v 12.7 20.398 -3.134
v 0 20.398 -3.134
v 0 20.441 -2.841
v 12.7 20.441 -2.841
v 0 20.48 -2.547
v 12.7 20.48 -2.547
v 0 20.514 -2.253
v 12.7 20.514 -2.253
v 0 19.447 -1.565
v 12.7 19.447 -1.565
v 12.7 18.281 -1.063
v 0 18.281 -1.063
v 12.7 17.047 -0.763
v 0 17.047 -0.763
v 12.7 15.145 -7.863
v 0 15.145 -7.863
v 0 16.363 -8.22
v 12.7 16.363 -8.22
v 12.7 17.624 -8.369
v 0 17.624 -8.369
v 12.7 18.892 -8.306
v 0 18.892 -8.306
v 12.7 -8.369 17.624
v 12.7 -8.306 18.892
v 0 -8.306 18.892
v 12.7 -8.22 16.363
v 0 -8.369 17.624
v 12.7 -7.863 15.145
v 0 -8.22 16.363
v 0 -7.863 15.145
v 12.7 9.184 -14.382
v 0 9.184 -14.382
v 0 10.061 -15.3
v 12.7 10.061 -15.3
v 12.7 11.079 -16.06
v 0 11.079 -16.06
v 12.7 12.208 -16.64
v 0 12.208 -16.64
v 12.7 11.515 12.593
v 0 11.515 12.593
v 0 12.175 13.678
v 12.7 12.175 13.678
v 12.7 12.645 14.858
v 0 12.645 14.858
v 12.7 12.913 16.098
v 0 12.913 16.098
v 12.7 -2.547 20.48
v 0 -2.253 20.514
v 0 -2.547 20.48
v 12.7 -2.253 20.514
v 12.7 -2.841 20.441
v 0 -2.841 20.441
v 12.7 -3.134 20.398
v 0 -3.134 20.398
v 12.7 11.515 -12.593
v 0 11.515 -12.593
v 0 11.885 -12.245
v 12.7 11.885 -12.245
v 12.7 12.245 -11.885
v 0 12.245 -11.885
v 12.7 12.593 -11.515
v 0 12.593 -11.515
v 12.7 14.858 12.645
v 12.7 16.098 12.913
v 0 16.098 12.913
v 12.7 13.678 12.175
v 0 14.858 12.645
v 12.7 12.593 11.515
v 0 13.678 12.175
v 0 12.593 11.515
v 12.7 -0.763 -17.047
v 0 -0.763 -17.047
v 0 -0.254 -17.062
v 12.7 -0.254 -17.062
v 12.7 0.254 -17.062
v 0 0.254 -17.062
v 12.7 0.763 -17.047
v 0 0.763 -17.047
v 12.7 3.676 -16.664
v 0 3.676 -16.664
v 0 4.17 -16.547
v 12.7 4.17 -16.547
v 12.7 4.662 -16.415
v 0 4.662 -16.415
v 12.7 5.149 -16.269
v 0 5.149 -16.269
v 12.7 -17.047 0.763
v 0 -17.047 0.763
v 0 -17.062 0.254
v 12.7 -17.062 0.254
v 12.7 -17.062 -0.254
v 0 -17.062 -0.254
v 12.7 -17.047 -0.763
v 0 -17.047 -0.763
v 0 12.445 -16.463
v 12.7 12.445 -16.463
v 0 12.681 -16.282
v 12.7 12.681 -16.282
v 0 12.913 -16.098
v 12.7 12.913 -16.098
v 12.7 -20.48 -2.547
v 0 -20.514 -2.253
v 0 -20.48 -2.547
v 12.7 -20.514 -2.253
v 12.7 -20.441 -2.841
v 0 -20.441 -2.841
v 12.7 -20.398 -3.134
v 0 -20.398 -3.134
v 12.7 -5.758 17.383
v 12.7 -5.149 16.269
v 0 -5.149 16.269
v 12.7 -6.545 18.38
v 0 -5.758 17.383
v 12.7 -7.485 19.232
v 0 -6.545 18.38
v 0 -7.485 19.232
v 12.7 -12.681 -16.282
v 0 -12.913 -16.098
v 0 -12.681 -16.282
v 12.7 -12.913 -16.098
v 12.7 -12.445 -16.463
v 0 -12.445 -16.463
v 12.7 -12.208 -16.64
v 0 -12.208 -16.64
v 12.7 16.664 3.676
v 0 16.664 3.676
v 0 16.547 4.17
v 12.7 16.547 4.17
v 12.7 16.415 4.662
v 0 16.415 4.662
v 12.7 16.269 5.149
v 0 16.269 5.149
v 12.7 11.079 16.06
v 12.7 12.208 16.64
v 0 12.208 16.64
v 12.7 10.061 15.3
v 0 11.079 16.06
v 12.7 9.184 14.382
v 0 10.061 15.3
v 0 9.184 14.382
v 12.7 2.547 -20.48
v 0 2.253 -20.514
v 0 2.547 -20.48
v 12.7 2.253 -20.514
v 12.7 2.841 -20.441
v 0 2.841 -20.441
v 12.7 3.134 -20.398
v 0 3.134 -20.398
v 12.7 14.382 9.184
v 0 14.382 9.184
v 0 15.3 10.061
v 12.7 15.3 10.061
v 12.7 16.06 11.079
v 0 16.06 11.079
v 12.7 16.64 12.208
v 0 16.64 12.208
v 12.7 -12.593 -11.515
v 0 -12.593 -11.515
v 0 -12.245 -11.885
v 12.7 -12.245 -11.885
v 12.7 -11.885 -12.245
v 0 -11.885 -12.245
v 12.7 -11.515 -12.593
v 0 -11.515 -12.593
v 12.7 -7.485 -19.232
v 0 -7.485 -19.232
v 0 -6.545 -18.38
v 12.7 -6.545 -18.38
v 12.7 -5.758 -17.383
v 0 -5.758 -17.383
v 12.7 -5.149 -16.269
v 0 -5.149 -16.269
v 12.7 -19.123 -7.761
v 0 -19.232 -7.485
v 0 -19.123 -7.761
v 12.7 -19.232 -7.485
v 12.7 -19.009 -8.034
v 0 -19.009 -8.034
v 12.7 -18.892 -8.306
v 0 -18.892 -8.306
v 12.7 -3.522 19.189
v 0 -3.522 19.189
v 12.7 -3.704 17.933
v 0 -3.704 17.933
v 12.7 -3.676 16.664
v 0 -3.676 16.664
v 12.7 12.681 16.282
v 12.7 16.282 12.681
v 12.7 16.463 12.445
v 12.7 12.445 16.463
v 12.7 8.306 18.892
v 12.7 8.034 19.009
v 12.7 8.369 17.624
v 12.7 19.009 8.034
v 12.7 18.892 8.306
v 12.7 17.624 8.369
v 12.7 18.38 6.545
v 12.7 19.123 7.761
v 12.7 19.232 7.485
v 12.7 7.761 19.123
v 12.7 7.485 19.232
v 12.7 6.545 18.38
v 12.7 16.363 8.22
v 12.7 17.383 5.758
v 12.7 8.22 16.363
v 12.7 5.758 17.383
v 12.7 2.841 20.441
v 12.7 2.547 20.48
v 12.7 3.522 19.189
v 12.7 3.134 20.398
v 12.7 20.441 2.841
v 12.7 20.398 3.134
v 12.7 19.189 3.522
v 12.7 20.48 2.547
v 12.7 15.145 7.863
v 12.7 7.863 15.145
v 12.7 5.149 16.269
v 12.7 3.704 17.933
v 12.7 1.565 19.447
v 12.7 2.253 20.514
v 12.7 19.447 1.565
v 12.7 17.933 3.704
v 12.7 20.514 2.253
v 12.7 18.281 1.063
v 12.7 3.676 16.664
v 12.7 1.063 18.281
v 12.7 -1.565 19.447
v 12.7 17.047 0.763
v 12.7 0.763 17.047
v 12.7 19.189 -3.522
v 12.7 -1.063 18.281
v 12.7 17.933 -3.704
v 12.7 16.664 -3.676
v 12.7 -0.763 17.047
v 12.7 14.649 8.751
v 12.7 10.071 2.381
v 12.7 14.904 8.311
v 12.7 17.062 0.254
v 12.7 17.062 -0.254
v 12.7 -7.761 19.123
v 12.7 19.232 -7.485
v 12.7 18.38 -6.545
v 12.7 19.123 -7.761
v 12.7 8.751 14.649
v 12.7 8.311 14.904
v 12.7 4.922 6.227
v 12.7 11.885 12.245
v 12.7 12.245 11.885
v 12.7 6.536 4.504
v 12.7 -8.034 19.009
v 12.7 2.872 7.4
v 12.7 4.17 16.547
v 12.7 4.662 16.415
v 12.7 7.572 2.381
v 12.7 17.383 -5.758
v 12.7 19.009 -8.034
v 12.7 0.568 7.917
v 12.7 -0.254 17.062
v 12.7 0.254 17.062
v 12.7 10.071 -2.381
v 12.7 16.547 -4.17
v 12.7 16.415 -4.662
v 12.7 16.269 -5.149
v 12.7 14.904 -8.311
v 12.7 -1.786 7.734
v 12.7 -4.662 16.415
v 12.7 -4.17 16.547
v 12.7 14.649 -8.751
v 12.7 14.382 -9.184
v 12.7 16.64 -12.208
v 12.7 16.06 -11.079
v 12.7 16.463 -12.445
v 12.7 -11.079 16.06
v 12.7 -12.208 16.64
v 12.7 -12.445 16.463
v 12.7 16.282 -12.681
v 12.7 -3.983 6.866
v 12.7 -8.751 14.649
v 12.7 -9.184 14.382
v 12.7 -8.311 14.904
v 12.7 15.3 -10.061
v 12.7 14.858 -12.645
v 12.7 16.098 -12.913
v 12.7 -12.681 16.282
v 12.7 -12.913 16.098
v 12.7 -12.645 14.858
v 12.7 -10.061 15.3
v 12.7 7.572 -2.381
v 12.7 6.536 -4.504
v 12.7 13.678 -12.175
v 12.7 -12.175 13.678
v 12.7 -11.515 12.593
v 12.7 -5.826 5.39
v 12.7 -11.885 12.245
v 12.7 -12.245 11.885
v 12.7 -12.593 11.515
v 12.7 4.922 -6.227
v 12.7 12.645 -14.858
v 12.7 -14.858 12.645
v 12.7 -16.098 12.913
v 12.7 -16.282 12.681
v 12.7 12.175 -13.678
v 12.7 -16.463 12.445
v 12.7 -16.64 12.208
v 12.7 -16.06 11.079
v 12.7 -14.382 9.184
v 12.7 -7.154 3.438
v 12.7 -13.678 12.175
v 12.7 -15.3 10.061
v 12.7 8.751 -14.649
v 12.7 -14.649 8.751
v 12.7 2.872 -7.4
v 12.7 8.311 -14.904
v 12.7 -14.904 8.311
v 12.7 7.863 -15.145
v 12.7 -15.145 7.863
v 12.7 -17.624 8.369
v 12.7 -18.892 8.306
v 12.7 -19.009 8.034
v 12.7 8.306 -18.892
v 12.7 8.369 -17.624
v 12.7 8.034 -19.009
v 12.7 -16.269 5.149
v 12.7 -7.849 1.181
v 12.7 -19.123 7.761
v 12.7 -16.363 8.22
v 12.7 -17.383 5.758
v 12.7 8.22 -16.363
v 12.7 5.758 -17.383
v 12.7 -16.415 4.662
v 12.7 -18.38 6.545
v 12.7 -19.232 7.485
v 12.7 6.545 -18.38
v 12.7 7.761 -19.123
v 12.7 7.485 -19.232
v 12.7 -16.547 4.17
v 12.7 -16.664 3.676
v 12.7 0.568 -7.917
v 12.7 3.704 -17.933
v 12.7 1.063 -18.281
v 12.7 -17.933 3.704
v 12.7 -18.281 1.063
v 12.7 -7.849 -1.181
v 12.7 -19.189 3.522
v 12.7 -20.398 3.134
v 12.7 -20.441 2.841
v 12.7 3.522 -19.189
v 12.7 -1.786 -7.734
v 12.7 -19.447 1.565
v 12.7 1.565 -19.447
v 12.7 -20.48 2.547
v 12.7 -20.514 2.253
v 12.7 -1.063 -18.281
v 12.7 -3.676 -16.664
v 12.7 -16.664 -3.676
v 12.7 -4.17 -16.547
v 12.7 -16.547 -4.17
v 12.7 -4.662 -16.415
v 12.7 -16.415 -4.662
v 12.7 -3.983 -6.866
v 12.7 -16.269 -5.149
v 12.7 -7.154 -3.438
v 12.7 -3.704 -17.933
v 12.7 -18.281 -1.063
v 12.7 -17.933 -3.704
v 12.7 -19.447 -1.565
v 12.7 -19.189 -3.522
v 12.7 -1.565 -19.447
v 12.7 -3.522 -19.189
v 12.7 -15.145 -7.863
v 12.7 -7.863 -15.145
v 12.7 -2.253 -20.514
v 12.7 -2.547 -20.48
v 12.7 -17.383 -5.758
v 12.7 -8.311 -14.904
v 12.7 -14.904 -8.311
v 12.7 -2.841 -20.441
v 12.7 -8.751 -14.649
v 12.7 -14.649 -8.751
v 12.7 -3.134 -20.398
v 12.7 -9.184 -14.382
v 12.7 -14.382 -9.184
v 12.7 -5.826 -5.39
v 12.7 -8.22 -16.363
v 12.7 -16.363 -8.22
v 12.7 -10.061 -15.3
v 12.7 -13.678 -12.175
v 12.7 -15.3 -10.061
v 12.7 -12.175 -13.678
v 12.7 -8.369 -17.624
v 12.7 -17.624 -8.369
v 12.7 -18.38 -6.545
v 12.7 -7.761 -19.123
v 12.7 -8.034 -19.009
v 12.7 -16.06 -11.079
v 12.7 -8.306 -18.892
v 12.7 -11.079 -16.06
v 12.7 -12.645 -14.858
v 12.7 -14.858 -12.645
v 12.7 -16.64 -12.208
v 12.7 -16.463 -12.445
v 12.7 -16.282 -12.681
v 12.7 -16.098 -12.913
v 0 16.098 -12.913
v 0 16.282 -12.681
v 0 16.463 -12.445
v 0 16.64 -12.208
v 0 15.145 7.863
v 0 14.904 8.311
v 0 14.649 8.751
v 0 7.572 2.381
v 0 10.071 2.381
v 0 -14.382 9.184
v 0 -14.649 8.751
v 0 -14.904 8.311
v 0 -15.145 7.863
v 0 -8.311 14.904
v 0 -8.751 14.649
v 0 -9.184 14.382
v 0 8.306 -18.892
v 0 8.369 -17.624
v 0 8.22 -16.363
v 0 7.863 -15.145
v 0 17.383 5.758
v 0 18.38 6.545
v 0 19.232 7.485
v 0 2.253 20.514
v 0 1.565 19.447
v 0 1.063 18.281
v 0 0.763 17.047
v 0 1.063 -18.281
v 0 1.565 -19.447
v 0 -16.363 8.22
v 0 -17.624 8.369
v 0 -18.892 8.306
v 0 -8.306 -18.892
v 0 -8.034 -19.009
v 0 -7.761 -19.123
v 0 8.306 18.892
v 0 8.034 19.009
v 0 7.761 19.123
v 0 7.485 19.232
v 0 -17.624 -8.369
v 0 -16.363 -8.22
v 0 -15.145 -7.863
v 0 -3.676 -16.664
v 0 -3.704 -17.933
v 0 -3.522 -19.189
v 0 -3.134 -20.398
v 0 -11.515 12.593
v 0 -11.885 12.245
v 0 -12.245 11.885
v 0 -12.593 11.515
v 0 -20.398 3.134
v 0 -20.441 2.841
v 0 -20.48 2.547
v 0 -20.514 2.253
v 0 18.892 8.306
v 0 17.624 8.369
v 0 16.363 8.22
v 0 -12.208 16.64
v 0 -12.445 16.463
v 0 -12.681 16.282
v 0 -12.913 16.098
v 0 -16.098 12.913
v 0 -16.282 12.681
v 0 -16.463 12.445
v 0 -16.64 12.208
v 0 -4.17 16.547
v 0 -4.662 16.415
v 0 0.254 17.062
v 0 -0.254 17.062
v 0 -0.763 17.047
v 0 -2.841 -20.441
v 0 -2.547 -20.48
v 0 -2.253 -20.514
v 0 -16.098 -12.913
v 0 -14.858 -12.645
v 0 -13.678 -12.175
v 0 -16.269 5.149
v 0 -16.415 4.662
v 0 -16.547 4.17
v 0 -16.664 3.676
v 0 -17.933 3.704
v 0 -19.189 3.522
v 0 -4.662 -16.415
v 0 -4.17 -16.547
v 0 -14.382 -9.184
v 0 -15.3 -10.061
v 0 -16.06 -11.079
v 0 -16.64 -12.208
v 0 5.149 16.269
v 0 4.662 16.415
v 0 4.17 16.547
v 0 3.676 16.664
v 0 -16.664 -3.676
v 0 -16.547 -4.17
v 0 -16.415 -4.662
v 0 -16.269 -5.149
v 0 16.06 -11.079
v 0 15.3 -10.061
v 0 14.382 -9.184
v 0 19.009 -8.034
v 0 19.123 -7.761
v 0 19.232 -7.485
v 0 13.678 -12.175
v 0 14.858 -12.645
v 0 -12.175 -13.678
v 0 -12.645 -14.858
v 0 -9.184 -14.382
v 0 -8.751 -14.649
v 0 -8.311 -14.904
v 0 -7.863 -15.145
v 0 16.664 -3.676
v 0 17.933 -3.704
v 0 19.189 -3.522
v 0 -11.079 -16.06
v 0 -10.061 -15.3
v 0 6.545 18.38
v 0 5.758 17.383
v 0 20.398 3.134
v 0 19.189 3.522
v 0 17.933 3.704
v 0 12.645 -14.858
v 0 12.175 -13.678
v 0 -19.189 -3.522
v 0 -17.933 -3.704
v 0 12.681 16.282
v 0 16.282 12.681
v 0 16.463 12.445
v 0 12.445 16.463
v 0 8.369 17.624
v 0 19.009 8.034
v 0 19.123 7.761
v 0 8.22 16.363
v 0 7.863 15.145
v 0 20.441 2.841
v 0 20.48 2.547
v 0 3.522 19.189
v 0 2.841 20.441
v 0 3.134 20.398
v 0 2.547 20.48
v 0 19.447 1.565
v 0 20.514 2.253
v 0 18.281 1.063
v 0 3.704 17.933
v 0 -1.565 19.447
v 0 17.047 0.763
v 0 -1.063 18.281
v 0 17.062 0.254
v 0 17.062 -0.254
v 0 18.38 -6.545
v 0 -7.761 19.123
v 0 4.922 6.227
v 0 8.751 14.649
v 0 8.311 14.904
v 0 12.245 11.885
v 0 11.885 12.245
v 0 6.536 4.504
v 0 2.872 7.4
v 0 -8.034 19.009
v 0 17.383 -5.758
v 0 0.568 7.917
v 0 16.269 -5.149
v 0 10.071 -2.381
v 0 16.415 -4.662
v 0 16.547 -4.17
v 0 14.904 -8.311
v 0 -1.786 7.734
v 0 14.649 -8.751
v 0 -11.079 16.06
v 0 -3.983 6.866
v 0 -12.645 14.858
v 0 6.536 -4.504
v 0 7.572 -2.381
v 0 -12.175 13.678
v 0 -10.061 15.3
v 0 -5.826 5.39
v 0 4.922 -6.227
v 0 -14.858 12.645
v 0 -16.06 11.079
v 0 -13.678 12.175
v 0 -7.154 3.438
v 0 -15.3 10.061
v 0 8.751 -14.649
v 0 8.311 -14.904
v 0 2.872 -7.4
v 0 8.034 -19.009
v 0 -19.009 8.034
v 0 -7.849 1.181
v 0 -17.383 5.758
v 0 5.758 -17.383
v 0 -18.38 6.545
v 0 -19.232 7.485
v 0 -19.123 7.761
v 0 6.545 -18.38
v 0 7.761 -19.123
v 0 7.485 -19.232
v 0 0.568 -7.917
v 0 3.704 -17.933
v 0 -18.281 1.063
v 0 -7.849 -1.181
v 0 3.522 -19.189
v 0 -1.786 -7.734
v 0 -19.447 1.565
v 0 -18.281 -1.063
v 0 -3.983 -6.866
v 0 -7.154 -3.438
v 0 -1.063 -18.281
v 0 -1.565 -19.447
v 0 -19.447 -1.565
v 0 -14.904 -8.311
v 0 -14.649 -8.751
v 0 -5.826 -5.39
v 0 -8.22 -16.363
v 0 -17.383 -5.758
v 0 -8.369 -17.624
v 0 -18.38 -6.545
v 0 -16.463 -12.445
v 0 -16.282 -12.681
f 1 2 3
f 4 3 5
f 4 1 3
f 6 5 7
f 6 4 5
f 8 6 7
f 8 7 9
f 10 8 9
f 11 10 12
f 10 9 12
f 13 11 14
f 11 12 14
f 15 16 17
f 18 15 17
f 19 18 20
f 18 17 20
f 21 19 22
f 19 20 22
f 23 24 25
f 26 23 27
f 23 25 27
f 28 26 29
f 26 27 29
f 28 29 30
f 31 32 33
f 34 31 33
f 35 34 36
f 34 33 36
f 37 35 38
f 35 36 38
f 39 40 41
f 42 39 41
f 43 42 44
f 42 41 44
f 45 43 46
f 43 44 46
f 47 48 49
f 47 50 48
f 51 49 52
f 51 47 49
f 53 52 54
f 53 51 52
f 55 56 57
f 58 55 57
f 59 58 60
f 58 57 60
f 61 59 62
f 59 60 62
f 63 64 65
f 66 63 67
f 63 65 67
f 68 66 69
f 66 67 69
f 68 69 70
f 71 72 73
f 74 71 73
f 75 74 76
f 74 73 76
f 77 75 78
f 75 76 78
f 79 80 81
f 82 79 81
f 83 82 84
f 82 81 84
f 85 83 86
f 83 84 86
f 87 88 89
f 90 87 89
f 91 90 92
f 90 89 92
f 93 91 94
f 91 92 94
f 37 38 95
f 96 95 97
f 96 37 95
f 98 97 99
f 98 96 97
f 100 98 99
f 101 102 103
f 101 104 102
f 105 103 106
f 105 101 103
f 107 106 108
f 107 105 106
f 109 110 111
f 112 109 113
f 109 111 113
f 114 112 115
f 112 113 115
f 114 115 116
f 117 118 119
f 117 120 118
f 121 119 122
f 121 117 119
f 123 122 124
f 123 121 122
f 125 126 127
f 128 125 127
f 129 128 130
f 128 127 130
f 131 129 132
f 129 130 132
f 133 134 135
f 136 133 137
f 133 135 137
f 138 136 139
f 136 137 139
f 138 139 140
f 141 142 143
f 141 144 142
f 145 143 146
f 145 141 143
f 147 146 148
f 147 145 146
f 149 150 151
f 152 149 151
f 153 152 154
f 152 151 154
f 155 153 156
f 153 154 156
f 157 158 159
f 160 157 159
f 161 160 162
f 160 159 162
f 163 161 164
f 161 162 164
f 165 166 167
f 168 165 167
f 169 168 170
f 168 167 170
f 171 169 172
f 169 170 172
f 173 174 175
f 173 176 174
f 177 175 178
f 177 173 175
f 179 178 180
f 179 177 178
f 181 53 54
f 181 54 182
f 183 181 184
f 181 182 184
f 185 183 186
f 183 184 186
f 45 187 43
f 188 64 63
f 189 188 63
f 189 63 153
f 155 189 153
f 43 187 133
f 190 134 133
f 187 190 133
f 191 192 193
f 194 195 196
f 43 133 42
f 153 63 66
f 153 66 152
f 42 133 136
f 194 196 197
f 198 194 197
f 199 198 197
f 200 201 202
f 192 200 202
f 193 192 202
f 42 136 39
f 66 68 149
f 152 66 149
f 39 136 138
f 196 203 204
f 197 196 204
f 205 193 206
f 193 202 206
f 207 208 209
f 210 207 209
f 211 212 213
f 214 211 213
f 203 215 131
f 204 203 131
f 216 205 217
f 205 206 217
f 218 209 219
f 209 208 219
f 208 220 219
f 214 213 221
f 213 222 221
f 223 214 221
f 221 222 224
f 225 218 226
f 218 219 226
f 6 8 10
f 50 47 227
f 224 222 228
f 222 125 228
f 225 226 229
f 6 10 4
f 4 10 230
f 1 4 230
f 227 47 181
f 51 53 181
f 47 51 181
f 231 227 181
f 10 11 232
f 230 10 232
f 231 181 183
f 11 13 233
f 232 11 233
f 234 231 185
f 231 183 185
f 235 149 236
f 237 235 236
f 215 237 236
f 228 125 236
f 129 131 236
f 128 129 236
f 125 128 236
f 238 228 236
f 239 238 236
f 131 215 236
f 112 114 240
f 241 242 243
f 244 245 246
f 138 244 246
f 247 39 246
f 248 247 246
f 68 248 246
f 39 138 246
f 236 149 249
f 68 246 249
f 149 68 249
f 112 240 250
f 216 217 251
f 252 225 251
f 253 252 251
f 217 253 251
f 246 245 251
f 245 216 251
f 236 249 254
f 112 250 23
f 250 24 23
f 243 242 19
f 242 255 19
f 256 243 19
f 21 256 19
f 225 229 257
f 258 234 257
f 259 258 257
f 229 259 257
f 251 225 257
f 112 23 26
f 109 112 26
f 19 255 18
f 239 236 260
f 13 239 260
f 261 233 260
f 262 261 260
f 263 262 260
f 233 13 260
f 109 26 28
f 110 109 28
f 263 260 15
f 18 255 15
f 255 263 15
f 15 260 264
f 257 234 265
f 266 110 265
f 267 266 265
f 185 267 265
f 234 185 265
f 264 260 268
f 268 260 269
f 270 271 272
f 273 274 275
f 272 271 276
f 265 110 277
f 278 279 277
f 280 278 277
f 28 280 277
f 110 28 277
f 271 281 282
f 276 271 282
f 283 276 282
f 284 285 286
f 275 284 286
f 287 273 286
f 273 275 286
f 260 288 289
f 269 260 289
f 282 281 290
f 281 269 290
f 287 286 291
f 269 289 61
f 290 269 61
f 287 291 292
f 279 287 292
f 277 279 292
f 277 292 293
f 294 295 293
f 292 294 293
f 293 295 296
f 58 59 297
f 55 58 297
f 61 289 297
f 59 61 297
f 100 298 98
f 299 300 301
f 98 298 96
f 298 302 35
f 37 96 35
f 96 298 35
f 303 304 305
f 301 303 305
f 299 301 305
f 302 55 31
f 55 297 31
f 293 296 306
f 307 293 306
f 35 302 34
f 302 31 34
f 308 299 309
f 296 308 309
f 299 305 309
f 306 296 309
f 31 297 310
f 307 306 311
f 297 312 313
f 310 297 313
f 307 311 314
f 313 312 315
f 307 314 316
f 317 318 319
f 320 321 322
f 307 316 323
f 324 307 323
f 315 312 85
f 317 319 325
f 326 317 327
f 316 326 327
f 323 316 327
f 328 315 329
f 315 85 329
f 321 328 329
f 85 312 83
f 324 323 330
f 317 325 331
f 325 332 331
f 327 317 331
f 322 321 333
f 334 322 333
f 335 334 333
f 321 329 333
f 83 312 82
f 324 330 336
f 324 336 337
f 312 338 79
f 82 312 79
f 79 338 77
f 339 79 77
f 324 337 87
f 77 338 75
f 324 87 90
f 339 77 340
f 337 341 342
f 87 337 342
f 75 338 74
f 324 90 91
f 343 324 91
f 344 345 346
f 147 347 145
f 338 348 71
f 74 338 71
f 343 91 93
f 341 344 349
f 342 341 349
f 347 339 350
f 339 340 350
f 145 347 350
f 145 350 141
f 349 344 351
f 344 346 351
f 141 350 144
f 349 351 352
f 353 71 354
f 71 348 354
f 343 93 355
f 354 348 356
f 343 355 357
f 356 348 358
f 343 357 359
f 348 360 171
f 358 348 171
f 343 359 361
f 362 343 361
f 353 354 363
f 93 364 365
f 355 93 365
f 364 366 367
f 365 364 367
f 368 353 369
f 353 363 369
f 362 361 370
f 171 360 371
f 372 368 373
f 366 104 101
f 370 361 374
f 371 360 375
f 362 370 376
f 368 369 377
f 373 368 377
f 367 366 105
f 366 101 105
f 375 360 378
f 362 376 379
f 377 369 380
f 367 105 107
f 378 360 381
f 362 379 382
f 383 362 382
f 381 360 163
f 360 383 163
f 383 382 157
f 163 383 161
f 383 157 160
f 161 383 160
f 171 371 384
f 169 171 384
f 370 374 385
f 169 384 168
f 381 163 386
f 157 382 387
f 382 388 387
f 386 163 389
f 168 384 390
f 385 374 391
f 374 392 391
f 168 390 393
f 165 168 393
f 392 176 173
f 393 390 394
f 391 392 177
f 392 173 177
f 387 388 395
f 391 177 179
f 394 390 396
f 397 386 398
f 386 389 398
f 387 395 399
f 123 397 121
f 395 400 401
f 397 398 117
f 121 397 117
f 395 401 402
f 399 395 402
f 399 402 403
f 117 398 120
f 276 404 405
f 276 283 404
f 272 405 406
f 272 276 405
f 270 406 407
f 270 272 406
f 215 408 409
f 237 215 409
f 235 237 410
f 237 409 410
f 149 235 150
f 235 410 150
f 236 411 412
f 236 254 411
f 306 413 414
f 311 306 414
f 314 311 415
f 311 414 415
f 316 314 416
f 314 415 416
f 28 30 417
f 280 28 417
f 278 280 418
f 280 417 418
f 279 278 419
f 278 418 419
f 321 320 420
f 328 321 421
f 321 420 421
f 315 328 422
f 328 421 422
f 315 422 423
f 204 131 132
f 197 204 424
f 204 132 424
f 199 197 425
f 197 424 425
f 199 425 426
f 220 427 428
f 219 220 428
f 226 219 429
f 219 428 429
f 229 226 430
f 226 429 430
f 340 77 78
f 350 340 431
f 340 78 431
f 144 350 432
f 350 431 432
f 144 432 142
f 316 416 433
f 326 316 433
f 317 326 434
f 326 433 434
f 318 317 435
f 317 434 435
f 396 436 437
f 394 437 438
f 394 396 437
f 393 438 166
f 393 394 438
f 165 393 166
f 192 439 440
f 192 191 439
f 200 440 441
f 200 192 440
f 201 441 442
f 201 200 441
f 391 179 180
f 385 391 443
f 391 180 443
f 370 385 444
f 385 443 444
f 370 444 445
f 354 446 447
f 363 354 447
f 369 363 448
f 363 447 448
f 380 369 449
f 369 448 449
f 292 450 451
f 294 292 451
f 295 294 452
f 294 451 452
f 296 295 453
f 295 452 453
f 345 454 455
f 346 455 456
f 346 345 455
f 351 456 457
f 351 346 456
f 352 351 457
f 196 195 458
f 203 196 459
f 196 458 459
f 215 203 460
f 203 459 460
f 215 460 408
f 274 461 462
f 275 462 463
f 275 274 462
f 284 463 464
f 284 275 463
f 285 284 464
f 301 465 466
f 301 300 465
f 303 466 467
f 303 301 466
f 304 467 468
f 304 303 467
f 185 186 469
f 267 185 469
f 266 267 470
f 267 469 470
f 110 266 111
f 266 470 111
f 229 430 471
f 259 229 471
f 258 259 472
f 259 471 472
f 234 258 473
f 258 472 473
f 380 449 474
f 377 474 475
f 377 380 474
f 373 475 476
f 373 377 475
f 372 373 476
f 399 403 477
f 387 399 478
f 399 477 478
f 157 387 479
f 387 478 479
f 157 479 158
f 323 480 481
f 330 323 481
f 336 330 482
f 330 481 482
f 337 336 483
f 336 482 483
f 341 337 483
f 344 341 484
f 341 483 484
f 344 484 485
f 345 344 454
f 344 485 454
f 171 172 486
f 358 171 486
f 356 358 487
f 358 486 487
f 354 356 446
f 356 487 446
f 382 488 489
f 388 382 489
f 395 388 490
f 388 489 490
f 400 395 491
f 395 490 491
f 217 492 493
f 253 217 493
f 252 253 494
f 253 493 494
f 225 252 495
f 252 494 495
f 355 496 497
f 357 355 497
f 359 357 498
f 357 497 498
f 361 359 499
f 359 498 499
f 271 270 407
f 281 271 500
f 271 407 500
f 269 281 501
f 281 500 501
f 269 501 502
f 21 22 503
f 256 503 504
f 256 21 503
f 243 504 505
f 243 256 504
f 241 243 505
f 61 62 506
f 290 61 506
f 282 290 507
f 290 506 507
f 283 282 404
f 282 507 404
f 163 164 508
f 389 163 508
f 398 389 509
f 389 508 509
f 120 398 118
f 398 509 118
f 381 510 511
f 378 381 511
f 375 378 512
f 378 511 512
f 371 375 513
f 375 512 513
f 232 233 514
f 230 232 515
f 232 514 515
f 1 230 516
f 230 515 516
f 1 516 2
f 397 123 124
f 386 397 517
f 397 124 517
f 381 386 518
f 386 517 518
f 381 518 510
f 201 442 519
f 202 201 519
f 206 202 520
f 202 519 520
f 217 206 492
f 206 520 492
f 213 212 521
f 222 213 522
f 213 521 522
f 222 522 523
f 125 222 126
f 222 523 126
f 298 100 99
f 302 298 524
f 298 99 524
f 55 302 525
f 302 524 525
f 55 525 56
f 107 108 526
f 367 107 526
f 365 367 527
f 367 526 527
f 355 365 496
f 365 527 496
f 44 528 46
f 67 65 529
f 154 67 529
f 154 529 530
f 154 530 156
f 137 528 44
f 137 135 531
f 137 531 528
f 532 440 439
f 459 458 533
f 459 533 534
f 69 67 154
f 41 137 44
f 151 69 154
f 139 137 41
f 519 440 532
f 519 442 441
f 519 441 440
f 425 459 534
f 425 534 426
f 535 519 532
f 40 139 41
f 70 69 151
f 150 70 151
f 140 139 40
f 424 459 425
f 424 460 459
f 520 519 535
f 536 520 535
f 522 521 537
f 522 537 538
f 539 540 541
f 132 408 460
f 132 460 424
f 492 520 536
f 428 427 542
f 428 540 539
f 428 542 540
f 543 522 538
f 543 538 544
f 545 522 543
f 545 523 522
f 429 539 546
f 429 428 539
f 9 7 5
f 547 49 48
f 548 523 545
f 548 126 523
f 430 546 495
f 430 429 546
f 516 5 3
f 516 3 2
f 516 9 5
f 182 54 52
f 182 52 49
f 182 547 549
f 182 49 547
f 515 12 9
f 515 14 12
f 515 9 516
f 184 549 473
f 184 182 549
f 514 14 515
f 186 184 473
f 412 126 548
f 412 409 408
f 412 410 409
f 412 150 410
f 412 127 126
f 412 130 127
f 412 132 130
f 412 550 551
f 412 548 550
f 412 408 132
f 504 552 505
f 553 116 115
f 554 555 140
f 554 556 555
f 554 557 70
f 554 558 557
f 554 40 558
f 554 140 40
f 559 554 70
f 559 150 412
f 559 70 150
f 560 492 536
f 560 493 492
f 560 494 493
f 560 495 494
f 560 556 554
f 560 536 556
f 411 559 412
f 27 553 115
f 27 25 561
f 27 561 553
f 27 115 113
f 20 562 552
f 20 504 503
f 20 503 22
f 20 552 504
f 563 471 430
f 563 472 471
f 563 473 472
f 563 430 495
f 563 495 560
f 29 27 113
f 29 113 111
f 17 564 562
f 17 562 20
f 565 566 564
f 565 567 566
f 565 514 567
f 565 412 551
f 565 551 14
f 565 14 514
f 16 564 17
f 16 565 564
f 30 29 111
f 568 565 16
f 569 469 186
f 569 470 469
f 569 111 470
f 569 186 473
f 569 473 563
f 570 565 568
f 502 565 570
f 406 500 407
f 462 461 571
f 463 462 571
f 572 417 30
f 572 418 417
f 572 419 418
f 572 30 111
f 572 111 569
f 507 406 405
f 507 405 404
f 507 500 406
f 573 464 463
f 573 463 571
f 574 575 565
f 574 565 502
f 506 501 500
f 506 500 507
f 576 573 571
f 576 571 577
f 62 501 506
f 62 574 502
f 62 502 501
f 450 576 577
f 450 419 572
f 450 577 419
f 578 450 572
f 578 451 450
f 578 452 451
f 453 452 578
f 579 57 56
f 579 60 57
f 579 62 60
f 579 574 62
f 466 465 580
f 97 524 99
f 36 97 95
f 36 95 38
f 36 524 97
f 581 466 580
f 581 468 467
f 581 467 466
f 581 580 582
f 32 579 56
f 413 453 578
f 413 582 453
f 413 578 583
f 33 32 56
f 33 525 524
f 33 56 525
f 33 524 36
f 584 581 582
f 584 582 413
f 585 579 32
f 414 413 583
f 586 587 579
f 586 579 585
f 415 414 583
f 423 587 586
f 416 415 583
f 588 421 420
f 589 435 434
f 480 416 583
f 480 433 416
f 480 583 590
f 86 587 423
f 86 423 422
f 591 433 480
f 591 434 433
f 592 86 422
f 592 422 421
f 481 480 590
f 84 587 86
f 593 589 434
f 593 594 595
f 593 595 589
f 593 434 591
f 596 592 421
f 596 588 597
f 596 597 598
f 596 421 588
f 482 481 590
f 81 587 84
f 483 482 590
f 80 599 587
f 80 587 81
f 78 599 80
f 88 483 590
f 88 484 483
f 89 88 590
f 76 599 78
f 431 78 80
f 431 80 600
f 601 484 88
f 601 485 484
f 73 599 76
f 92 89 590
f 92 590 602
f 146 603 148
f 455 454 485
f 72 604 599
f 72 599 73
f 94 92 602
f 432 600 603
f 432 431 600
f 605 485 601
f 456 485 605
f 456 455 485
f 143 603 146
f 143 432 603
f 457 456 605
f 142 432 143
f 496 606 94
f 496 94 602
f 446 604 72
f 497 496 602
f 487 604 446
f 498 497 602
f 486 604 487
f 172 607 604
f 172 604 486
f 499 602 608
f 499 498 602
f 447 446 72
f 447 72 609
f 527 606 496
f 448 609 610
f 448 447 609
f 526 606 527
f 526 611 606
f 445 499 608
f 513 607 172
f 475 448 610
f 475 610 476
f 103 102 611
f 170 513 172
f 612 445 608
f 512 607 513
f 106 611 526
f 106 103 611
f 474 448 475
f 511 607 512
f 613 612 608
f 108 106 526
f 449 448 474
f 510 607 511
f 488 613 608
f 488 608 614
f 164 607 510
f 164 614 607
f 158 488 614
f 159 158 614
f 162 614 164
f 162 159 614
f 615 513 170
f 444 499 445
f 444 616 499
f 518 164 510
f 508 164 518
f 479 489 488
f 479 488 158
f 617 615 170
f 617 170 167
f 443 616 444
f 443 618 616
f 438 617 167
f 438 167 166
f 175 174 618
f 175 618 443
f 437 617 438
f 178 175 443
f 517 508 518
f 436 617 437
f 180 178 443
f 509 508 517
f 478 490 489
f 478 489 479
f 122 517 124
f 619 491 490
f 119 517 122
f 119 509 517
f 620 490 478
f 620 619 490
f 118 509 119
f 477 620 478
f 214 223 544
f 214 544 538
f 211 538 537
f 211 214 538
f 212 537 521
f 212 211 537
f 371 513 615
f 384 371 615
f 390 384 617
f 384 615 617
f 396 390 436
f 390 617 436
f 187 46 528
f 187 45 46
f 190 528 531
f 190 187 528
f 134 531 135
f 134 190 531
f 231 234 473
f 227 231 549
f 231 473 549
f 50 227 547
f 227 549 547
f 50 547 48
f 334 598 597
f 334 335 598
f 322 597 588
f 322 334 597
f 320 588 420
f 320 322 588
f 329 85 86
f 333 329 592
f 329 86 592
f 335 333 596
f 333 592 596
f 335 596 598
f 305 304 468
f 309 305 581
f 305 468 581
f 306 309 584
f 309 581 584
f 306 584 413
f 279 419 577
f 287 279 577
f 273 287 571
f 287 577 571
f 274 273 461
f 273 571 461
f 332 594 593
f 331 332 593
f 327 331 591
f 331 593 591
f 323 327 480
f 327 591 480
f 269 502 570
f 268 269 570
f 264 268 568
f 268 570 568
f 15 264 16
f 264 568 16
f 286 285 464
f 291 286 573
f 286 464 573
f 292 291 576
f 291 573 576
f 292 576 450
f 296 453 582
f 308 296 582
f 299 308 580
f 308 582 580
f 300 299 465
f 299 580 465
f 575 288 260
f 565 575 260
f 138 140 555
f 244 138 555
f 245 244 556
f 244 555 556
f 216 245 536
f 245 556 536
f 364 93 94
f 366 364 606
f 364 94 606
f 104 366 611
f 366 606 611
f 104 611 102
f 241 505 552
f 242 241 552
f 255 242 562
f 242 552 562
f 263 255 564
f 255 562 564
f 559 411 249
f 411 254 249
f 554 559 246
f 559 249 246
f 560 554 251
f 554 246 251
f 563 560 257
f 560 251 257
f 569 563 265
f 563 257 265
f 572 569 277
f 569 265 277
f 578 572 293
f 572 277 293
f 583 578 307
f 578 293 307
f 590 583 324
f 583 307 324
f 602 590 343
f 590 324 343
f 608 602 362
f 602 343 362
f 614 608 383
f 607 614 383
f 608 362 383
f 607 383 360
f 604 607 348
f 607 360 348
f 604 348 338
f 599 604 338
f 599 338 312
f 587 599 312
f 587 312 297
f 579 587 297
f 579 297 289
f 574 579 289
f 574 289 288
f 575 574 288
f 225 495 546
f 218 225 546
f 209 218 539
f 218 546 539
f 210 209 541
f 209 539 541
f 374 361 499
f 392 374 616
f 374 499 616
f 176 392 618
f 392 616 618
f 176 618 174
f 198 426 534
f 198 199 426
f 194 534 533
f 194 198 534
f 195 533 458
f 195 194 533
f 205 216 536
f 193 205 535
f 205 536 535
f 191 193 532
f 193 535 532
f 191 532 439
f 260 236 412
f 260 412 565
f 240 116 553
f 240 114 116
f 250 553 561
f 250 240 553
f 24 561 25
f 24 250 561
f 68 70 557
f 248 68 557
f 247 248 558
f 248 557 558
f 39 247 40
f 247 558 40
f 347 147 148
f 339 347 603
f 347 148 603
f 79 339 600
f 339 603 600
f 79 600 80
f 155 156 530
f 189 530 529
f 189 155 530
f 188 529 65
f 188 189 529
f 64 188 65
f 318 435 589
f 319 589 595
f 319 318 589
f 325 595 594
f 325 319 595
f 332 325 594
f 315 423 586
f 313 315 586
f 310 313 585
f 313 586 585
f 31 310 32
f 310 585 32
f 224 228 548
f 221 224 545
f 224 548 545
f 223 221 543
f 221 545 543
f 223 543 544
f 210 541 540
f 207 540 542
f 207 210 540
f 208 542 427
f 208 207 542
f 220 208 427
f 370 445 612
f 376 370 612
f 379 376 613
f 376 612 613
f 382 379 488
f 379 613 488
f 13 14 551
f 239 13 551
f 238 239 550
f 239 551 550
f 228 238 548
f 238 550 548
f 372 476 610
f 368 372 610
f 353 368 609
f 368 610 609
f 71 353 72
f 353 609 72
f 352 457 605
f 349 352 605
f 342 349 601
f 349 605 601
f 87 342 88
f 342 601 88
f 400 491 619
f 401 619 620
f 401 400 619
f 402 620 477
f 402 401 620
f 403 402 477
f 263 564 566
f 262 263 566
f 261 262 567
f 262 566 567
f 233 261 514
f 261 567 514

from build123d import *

# Parameters (mm, degrees)
BASPROSKE_W        = 12.7
BASPROSKE_H        = 20.6375
TOOTHCUT_DEPTH     = 32.829276029
TEETHCUTS_COUNT    = 24
TEETHCUTS_ANGLE    = 345
BORSKE_R           = 7.9375
BORE_DEPTH         = 50.8000508
KEYSKE_W           = 4.7625
KEYSKE_H           = 9.2837
KEYWAY_DEPTH       = 50.8000508
SKETCH2_W          = 4.7625
SKETCH2_H          = 0.7874
CUT_EXTRUDE2_DEPTH = 32.669469117


with BuildPart() as part:
    # BasProSke → Base-Revolve (revolve)
    with BuildSketch(Plane(origin=(0, 0, 0), x_dir=(1, 0, 0), z_dir=(0, 1, 0)), mode=Mode.PRIVATE) as base_revolve_sk:
        with Locations((6.35, 10.31875)):
            Rectangle(BASPROSKE_W, BASPROSKE_H)
    revolve(base_revolve_sk.sketch.rotate(Axis((-10, 0, 0), (1, 0, 0)), 180), axis=Axis((-10, 0, 0), (1, 0, 0)))

    # TooCutSke → ToothCut (cut, through all)
    with BuildSketch(Plane(origin=(0, 0, 0), x_dir=(0, 0, -1), z_dir=(1, 0, 0))):
        with BuildLine():
            ThreePointArc((0.762542858, 17.047308877), (0, 17.064355), (-0.762542858, 17.047308877))
            ThreePointArc((-0.762542858, 17.047308877), (-1.295412414, 18.888113288), (-2.270705673, 20.537753824))
            ThreePointArc((-2.270705673, 20.537753824), (0, 20.6629), (2.270705673, 20.537753824))
            ThreePointArc((2.270705673, 20.537753824), (1.295412414, 18.888113288), (0.762542858, 17.047308877))
        make_face()
    toothcut = extrude(amount=TOOTHCUT_DEPTH, mode=Mode.SUBTRACT)

    # TeethCuts: ToothCut ×24 about axis
    teethcuts_axis = Axis((-10, 0, 0), (1, 0, 0))
    for i in range(1, TEETHCUTS_COUNT):
        add(toothcut.rotate(teethcuts_axis, i * TEETHCUTS_ANGLE / (TEETHCUTS_COUNT - 1)), mode=Mode.SUBTRACT)

    # BorSke → Bore (cut, symmetric)
    with BuildSketch(Plane(origin=(0, 0, 0), x_dir=(0, 0, -1), z_dir=(1, 0, 0))):
        with Locations(Location((0, 0, 0), (0, 0, 180))):
            Circle(BORSKE_R)
    extrude(amount=BORE_DEPTH, both=True, mode=Mode.SUBTRACT)

    # KeySke → Keyway (cut, symmetric)
    with BuildSketch(Plane(origin=(0, 0, 0), x_dir=(0, 0, -1), z_dir=(1, 0, 0))):
        with Locations((0, 4.64185)):
            Rectangle(KEYSKE_W, KEYSKE_H)
    extrude(amount=KEYWAY_DEPTH, both=True, mode=Mode.SUBTRACT)

    # Sketch2 → Cut-Extrude2 (cut, through all)
    with BuildSketch(Plane(origin=(12.7, 0, 0), x_dir=(0, 0, -1), z_dir=(1, 0, 0))):
        with Locations((0, 9.6774)):
            Rectangle(SKETCH2_W, SKETCH2_H)
    extrude(amount=-CUT_EXTRUDE2_DEPTH, mode=Mode.SUBTRACT)


solid = part.part
